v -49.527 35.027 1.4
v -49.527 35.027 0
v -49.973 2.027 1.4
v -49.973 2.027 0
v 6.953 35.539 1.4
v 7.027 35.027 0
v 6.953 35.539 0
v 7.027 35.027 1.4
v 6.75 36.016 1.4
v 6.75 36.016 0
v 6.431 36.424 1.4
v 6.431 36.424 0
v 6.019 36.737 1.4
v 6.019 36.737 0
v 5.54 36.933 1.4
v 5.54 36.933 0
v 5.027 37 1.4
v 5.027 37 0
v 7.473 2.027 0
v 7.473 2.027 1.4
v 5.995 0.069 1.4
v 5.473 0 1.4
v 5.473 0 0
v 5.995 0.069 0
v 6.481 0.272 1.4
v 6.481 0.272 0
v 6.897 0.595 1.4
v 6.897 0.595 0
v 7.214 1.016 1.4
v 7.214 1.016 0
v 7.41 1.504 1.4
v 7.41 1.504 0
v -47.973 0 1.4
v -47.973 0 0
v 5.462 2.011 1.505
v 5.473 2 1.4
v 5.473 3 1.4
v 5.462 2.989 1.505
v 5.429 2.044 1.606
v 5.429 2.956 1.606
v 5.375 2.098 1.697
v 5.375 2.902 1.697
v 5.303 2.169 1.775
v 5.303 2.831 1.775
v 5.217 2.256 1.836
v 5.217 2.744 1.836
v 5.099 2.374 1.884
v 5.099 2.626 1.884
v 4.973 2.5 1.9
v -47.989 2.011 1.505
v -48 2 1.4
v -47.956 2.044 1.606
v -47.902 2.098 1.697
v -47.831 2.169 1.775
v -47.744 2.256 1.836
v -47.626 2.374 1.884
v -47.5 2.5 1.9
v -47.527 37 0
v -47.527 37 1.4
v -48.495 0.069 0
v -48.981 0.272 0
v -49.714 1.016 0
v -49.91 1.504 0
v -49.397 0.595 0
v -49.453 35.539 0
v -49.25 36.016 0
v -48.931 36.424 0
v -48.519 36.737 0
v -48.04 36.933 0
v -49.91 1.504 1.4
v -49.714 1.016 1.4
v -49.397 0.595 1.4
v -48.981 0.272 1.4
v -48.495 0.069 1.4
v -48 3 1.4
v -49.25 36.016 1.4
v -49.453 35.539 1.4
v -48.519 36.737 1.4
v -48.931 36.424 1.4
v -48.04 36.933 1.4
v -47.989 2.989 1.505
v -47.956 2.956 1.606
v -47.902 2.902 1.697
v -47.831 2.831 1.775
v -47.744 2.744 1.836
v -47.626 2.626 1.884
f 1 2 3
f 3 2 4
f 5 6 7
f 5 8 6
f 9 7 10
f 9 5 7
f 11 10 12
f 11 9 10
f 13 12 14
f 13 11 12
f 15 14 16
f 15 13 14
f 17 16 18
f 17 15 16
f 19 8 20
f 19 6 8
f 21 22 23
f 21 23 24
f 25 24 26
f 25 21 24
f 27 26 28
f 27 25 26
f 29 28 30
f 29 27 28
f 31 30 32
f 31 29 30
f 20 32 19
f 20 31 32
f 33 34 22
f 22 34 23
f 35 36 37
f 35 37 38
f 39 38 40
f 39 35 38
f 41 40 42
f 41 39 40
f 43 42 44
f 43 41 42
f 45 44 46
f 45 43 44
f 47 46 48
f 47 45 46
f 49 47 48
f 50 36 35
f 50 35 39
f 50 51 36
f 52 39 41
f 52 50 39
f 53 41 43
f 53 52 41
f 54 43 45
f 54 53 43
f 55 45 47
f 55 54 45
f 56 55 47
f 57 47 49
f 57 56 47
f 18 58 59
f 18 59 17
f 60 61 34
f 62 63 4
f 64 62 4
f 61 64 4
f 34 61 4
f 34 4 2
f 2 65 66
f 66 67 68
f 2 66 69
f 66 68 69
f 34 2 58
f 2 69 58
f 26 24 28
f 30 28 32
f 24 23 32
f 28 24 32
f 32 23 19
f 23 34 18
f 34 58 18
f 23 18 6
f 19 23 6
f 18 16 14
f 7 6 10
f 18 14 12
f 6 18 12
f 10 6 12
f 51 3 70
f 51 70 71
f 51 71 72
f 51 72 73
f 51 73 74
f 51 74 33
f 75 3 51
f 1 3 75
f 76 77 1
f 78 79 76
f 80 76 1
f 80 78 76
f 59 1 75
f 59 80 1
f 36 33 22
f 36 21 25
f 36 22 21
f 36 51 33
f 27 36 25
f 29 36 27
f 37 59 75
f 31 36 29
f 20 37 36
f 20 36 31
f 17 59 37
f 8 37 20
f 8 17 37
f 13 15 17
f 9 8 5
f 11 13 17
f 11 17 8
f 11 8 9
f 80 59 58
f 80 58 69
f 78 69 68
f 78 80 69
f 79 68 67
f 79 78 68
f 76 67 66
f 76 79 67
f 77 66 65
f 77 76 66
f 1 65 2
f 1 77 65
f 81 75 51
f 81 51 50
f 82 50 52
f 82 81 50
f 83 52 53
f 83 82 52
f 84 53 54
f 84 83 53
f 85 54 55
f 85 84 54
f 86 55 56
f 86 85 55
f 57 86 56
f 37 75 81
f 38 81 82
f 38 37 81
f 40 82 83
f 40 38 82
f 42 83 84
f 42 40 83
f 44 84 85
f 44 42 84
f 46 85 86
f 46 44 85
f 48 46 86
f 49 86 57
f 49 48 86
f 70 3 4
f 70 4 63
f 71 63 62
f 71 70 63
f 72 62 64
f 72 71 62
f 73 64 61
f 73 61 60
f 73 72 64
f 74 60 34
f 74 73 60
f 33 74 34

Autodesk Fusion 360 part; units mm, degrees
sketch "Schizzo1" plane through (0, 0, 0) normal (0, 0, 1) x (1, 0, 0)
  line L0 (-50, 0) -> (7.5, 0)
  line L1 (-49.5, 37) -> (-50, 0)
  line L2 (7, 37) -> (7.5, 0)
  line L3 (-49.5, 37) -> (7, 37)
  dimension "d7" = 57.5
extrude "Estrusione1" add sketch "Schizzo1" along normal blind 1.4
fillet "Raccordo1" radius 2 4 edges at (-50, 0, 0.7) (-49.5, 37, 0.7) (7, 37, 0.7) (7.5, 0, 0.7)
sketch "Schizzo2" plane through (0, 0, 1.4) normal (0, 0, 1) x (-1, 0, 0)
  line L0 (47.9728, 0) -> (-5.4728, 0)
  line L1 (-7.4726, -2.027) -> (-7.0267, -35.027)
  line L2 (-5.0268, -37) -> (47.5268, -37)
  line L3 (49.5267, -35.027) -> (49.9726, -2.027)
  arc A0 (-5.4728, 0) -> (-7.4726, -2.027) centre (-5.4728, -2) ccw
  arc A1 (-7.0267, -35.027) -> (-5.0268, -37) centre (-5.0268, -35) ccw
  arc A2 (47.5268, -37) -> (49.5267, -35.027) centre (47.5268, -35) ccw
  arc A3 (49.9726, -2.027) -> (47.9728, 0) centre (47.9728, -2) ccw
  line L4 (-5.4728, -2) -> (48, -2)
  line L5 (48, -2) -> (48, -3)
  line L6 (48, -3) -> (-5.4728, -3)
  line L7 (-5.4728, -3) -> (-5.4728, -2)
extrude "Estrusione2" add sketch "Schizzo2" along normal blind 0.5 contours L4 L5 L6 L7
fillet "Raccordo2" radius 0.5 4 edges at (-21.2636, 3, 1.9) (-21.2636, 2, 1.9) (5.4728, 2.5, 1.9) (-48, 2.5, 1.9)
